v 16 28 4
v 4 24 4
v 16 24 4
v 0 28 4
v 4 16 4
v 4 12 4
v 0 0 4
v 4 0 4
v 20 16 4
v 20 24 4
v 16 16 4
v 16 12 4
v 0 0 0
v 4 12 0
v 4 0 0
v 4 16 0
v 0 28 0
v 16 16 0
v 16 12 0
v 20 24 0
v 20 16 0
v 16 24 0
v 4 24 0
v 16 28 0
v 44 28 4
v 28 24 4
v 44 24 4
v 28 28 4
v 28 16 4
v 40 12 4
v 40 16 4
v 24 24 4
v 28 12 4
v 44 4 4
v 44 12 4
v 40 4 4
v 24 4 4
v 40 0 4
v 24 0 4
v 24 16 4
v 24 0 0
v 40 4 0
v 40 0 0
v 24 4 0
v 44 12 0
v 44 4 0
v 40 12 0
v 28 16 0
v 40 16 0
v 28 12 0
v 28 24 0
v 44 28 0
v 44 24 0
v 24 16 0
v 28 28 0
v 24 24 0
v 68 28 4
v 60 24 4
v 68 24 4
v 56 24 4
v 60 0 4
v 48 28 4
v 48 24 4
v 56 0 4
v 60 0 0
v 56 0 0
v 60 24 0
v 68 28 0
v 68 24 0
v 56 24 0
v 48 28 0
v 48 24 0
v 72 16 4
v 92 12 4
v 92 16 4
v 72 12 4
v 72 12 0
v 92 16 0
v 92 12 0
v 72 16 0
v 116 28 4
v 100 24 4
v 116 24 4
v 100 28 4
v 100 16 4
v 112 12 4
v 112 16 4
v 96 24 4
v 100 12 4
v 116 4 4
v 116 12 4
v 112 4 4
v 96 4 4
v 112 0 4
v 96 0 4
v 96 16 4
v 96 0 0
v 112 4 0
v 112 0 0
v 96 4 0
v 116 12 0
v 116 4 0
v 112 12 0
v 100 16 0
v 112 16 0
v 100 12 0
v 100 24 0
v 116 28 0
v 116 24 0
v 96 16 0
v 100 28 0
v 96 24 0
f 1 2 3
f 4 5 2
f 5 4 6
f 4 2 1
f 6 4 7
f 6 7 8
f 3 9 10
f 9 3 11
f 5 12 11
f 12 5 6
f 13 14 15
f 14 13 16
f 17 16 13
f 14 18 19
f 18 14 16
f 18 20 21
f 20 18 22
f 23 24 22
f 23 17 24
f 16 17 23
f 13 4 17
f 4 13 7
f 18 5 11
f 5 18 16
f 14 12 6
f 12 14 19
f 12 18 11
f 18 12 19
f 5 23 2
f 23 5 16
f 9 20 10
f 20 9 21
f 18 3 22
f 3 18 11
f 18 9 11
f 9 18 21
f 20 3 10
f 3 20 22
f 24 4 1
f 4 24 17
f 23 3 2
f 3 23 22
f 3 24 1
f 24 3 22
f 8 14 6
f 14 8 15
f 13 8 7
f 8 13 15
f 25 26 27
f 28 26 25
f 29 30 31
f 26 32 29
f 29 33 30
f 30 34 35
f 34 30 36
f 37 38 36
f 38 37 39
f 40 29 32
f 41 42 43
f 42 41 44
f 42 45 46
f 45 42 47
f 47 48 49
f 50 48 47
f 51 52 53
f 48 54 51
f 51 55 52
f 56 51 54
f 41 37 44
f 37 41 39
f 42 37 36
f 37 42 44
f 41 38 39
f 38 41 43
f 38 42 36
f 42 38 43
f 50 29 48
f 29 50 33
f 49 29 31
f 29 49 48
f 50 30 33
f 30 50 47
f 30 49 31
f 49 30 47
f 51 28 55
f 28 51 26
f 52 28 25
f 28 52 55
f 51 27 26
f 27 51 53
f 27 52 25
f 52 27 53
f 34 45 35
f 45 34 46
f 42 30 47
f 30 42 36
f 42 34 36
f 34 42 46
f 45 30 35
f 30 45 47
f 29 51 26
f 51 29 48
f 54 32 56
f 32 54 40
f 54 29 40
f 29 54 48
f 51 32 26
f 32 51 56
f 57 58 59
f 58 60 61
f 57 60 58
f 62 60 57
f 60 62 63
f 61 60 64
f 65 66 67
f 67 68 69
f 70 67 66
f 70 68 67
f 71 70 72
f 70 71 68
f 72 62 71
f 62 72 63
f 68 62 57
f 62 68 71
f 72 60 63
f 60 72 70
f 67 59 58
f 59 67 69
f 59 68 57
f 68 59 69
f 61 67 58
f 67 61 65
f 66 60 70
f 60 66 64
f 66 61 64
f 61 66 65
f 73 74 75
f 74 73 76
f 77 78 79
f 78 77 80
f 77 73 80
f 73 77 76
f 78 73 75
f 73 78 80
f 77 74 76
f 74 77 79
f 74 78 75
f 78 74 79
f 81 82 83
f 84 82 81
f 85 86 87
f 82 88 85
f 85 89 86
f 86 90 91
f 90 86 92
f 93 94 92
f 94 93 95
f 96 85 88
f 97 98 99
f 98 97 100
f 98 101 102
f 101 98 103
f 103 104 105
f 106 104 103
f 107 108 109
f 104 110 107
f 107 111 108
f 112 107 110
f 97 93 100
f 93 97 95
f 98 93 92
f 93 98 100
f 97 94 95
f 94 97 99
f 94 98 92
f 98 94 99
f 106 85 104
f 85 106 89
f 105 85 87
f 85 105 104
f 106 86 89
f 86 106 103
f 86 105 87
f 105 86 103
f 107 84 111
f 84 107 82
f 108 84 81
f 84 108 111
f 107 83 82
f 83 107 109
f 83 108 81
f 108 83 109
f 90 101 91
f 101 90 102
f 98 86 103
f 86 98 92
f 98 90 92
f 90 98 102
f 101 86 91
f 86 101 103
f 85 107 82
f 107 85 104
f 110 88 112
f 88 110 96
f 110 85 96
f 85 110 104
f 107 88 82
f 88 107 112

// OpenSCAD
//Draw text
scale([4,4,4]) drawtext("PST-S");

//Draw character set
//scale([2,2,2]) drawtext(" !\"#$%&'()*+,-./0123456789:;<=>?@ABCDEFGHIJKLMNOPQRSTUVWXYZ[\\]^_`abcdefghijklmnopqrstuvwxyz{|}");

module drawtext(text) {
	//Characters
	chars = " !\"#$%&'()*+,-./0123456789:;<=>?@ABCDEFGHIJKLMNOPQRSTUVWXYZ[\\]^_`abcdefghijklmnopqrstuvwxyz{|}";

	//Chracter table defining 5x7 characters
	//Adapted from: http://www.geocities.com/dinceraydin/djlcdsim/chartable.js
	char_table = [ [ 0, 0, 0, 0, 0, 0, 0],
                  [ 4, 0, 4, 4, 4, 4, 4],
                  [ 0, 0, 0, 0,10,10,10],
                  [10,10,31,10,31,10,10],
                  [ 4,30, 5,14,20,15, 4],
                  [ 3,19, 8, 4, 2,25,24],
                  [13,18,21, 8,20,18,12],
                  [ 0, 0, 0, 0, 8, 4,12],
                  [ 2, 4, 8, 8, 8, 4, 2],
                  [ 8, 4, 2, 2, 2, 4, 8],
                  [ 0, 4,21,14,21, 4, 0],
                  [ 0, 4, 4,31, 4, 4, 0],
                  [ 8, 4,12, 0, 0, 0, 0],
                  [ 0, 0, 0,31, 0, 0, 0],
                  [12,12, 0, 0, 0, 0, 0],
                  [ 0,16, 8, 4, 2, 1, 0],
                  [14,17,25,21,19,17,14],
                  [14, 4, 4, 4, 4,12, 4],
                  [31, 8, 4, 2, 1,17,14],
                  [14,17, 1, 2, 4, 2,31],
                  [ 2, 2,31,18,10, 6, 2],
                  [14,17, 1, 1,30,16,31],
                  [14,17,17,30,16, 8, 6],
                  [ 8, 8, 8, 4, 2, 1,31],
                  [14,17,17,14,17,17,14],
                  [12, 2, 1,15,17,17,14],
                  [ 0,12,12, 0,12,12, 0],
                  [ 8, 4,12, 0,12,12, 0],
                  [ 2, 4, 8,16, 8, 4, 2],
                  [ 0, 0,31, 0,31, 0, 0],
                  [16, 8, 4, 2, 4, 8,16],
                  [ 4, 0, 4, 2, 1,17,14],
                  [14,21,21,13, 1,17,14],
                  [17,17,31,17,17,17,14],
                  [30,17,17,30,17,17,30],
                  [14,17,16,16,16,17,14],
                  [30,17,17,17,17,17,30],
                  [31,16,16,30,16,16,31],
                  [16,16,16,30,16,16,31],
                  [15,17,17,23,16,17,14],
                  [17,17,17,31,17,17,17],
                  [14, 4, 4, 4, 4, 4,14],
                  [12,18, 2, 2, 2, 2, 7],
                  [17,18,20,24,20,18,17],
                  [31,16,16,16,16,16,16],
                  [17,17,17,21,21,27,17],
                  [17,17,19,21,25,17,17],
                  [14,17,17,17,17,17,14],
                  [16,16,16,30,17,17,30],
                  [13,18,21,17,17,17,14],
                  [17,18,20,30,17,17,30],
                  [30, 1, 1,14,16,16,15],
                  [ 4, 4, 4, 4, 4, 4,31],
                  [14,17,17,17,17,17,17],
                  [ 4,10,17,17,17,17,17],
                  [10,21,21,21,17,17,17],
                  [17,17,10, 4,10,17,17],
                  [ 4, 4, 4,10,17,17,17],
                  [31,16, 8, 4, 2, 1,31],
                  [14, 8, 8, 8, 8, 8,14],
                  [ 0, 1, 2, 4, 8,16, 0],
                  [14, 2, 2, 2, 2, 2,14],
                  [ 0, 0, 0, 0,17,10, 4],
                  [31, 0, 0, 0, 0, 0, 0],
                  [ 0, 0, 0, 0, 2, 4, 8],
                  [15,17,15, 1,14, 0, 0],
                  [30,17,17,25,22,16,16],
                  [14,17,16,16,14, 0, 0],
                  [15,17,17,19,13, 1, 1],
                  [14,16,31,17,14, 0, 0],
                  [ 8, 8, 8,28, 8, 9, 6],
                  [14, 1,15,17,15, 0, 0],
                  [17,17,17,25,22,16,16],
                  [14, 4, 4, 4,12, 0, 4],
                  [12,18, 2, 2, 2, 6, 2],
                  [18,20,24,20,18,16,16],
                  [14, 4, 4, 4, 4, 4,12],
                  [17,17,21,21,26, 0, 0],
                  [17,17,17,25,22, 0, 0],
                  [14,17,17,17,14, 0, 0],
                  [16,16,30,17,30, 0, 0],
                  [ 1, 1,15,19,13, 0, 0],
                  [16,16,16,25,22, 0, 0],
                  [30, 1,14,16,15, 0, 0],
                  [ 6, 9, 8, 8,28, 8, 8],
                  [13,19,17,17,17, 0, 0],
                  [ 4,10,17,17,17, 0, 0],
                  [10,21,21,17,17, 0, 0],
                  [17,10, 4,10,17, 0, 0],
                  [14, 1,15,17,17, 0, 0],
                  [31, 8, 4, 2,31, 0, 0],
                  [ 2, 4, 4, 8, 4, 4, 2],
                  [ 4, 4, 4, 4, 4, 4, 4],
                  [ 8, 4, 4, 2, 4, 4, 8] ];

	//Binary decode table
	dec_table = [ "00000", "00001", "00010", "00011", "00100", "00101",
  	            "00110", "00111", "01000", "01001", "01010", "01011",
  	            "01100", "01101", "01110", "01111", "10000", "10001",
  	            "10010", "10011", "10100", "10101", "10110", "10111",
	            "11000", "11001", "11010", "11011", "11100", "11101",
	            "11110", "11111" ];

	//Process string one character at a time
	for(itext = [0:len(text)-1]) {
		//Convert character to index
		assign(ichar = search(text[itext],chars,1)[0]) {
			//Decode character - rows
			for(irow = [0:6]) {
				assign(val = dec_table[char_table[ichar][irow]]) {
					//Decode character - cols
					for(icol = [0:4]) {
						assign(bit = search(val[icol],"01",1)[0]) {
							if(bit) {
								//Output cube
								translate([icol + (6*itext), irow, 0])
									cube([1.0001,1.0001,1]);
							}
						}
					}
				}
			}
		}
	}
}
